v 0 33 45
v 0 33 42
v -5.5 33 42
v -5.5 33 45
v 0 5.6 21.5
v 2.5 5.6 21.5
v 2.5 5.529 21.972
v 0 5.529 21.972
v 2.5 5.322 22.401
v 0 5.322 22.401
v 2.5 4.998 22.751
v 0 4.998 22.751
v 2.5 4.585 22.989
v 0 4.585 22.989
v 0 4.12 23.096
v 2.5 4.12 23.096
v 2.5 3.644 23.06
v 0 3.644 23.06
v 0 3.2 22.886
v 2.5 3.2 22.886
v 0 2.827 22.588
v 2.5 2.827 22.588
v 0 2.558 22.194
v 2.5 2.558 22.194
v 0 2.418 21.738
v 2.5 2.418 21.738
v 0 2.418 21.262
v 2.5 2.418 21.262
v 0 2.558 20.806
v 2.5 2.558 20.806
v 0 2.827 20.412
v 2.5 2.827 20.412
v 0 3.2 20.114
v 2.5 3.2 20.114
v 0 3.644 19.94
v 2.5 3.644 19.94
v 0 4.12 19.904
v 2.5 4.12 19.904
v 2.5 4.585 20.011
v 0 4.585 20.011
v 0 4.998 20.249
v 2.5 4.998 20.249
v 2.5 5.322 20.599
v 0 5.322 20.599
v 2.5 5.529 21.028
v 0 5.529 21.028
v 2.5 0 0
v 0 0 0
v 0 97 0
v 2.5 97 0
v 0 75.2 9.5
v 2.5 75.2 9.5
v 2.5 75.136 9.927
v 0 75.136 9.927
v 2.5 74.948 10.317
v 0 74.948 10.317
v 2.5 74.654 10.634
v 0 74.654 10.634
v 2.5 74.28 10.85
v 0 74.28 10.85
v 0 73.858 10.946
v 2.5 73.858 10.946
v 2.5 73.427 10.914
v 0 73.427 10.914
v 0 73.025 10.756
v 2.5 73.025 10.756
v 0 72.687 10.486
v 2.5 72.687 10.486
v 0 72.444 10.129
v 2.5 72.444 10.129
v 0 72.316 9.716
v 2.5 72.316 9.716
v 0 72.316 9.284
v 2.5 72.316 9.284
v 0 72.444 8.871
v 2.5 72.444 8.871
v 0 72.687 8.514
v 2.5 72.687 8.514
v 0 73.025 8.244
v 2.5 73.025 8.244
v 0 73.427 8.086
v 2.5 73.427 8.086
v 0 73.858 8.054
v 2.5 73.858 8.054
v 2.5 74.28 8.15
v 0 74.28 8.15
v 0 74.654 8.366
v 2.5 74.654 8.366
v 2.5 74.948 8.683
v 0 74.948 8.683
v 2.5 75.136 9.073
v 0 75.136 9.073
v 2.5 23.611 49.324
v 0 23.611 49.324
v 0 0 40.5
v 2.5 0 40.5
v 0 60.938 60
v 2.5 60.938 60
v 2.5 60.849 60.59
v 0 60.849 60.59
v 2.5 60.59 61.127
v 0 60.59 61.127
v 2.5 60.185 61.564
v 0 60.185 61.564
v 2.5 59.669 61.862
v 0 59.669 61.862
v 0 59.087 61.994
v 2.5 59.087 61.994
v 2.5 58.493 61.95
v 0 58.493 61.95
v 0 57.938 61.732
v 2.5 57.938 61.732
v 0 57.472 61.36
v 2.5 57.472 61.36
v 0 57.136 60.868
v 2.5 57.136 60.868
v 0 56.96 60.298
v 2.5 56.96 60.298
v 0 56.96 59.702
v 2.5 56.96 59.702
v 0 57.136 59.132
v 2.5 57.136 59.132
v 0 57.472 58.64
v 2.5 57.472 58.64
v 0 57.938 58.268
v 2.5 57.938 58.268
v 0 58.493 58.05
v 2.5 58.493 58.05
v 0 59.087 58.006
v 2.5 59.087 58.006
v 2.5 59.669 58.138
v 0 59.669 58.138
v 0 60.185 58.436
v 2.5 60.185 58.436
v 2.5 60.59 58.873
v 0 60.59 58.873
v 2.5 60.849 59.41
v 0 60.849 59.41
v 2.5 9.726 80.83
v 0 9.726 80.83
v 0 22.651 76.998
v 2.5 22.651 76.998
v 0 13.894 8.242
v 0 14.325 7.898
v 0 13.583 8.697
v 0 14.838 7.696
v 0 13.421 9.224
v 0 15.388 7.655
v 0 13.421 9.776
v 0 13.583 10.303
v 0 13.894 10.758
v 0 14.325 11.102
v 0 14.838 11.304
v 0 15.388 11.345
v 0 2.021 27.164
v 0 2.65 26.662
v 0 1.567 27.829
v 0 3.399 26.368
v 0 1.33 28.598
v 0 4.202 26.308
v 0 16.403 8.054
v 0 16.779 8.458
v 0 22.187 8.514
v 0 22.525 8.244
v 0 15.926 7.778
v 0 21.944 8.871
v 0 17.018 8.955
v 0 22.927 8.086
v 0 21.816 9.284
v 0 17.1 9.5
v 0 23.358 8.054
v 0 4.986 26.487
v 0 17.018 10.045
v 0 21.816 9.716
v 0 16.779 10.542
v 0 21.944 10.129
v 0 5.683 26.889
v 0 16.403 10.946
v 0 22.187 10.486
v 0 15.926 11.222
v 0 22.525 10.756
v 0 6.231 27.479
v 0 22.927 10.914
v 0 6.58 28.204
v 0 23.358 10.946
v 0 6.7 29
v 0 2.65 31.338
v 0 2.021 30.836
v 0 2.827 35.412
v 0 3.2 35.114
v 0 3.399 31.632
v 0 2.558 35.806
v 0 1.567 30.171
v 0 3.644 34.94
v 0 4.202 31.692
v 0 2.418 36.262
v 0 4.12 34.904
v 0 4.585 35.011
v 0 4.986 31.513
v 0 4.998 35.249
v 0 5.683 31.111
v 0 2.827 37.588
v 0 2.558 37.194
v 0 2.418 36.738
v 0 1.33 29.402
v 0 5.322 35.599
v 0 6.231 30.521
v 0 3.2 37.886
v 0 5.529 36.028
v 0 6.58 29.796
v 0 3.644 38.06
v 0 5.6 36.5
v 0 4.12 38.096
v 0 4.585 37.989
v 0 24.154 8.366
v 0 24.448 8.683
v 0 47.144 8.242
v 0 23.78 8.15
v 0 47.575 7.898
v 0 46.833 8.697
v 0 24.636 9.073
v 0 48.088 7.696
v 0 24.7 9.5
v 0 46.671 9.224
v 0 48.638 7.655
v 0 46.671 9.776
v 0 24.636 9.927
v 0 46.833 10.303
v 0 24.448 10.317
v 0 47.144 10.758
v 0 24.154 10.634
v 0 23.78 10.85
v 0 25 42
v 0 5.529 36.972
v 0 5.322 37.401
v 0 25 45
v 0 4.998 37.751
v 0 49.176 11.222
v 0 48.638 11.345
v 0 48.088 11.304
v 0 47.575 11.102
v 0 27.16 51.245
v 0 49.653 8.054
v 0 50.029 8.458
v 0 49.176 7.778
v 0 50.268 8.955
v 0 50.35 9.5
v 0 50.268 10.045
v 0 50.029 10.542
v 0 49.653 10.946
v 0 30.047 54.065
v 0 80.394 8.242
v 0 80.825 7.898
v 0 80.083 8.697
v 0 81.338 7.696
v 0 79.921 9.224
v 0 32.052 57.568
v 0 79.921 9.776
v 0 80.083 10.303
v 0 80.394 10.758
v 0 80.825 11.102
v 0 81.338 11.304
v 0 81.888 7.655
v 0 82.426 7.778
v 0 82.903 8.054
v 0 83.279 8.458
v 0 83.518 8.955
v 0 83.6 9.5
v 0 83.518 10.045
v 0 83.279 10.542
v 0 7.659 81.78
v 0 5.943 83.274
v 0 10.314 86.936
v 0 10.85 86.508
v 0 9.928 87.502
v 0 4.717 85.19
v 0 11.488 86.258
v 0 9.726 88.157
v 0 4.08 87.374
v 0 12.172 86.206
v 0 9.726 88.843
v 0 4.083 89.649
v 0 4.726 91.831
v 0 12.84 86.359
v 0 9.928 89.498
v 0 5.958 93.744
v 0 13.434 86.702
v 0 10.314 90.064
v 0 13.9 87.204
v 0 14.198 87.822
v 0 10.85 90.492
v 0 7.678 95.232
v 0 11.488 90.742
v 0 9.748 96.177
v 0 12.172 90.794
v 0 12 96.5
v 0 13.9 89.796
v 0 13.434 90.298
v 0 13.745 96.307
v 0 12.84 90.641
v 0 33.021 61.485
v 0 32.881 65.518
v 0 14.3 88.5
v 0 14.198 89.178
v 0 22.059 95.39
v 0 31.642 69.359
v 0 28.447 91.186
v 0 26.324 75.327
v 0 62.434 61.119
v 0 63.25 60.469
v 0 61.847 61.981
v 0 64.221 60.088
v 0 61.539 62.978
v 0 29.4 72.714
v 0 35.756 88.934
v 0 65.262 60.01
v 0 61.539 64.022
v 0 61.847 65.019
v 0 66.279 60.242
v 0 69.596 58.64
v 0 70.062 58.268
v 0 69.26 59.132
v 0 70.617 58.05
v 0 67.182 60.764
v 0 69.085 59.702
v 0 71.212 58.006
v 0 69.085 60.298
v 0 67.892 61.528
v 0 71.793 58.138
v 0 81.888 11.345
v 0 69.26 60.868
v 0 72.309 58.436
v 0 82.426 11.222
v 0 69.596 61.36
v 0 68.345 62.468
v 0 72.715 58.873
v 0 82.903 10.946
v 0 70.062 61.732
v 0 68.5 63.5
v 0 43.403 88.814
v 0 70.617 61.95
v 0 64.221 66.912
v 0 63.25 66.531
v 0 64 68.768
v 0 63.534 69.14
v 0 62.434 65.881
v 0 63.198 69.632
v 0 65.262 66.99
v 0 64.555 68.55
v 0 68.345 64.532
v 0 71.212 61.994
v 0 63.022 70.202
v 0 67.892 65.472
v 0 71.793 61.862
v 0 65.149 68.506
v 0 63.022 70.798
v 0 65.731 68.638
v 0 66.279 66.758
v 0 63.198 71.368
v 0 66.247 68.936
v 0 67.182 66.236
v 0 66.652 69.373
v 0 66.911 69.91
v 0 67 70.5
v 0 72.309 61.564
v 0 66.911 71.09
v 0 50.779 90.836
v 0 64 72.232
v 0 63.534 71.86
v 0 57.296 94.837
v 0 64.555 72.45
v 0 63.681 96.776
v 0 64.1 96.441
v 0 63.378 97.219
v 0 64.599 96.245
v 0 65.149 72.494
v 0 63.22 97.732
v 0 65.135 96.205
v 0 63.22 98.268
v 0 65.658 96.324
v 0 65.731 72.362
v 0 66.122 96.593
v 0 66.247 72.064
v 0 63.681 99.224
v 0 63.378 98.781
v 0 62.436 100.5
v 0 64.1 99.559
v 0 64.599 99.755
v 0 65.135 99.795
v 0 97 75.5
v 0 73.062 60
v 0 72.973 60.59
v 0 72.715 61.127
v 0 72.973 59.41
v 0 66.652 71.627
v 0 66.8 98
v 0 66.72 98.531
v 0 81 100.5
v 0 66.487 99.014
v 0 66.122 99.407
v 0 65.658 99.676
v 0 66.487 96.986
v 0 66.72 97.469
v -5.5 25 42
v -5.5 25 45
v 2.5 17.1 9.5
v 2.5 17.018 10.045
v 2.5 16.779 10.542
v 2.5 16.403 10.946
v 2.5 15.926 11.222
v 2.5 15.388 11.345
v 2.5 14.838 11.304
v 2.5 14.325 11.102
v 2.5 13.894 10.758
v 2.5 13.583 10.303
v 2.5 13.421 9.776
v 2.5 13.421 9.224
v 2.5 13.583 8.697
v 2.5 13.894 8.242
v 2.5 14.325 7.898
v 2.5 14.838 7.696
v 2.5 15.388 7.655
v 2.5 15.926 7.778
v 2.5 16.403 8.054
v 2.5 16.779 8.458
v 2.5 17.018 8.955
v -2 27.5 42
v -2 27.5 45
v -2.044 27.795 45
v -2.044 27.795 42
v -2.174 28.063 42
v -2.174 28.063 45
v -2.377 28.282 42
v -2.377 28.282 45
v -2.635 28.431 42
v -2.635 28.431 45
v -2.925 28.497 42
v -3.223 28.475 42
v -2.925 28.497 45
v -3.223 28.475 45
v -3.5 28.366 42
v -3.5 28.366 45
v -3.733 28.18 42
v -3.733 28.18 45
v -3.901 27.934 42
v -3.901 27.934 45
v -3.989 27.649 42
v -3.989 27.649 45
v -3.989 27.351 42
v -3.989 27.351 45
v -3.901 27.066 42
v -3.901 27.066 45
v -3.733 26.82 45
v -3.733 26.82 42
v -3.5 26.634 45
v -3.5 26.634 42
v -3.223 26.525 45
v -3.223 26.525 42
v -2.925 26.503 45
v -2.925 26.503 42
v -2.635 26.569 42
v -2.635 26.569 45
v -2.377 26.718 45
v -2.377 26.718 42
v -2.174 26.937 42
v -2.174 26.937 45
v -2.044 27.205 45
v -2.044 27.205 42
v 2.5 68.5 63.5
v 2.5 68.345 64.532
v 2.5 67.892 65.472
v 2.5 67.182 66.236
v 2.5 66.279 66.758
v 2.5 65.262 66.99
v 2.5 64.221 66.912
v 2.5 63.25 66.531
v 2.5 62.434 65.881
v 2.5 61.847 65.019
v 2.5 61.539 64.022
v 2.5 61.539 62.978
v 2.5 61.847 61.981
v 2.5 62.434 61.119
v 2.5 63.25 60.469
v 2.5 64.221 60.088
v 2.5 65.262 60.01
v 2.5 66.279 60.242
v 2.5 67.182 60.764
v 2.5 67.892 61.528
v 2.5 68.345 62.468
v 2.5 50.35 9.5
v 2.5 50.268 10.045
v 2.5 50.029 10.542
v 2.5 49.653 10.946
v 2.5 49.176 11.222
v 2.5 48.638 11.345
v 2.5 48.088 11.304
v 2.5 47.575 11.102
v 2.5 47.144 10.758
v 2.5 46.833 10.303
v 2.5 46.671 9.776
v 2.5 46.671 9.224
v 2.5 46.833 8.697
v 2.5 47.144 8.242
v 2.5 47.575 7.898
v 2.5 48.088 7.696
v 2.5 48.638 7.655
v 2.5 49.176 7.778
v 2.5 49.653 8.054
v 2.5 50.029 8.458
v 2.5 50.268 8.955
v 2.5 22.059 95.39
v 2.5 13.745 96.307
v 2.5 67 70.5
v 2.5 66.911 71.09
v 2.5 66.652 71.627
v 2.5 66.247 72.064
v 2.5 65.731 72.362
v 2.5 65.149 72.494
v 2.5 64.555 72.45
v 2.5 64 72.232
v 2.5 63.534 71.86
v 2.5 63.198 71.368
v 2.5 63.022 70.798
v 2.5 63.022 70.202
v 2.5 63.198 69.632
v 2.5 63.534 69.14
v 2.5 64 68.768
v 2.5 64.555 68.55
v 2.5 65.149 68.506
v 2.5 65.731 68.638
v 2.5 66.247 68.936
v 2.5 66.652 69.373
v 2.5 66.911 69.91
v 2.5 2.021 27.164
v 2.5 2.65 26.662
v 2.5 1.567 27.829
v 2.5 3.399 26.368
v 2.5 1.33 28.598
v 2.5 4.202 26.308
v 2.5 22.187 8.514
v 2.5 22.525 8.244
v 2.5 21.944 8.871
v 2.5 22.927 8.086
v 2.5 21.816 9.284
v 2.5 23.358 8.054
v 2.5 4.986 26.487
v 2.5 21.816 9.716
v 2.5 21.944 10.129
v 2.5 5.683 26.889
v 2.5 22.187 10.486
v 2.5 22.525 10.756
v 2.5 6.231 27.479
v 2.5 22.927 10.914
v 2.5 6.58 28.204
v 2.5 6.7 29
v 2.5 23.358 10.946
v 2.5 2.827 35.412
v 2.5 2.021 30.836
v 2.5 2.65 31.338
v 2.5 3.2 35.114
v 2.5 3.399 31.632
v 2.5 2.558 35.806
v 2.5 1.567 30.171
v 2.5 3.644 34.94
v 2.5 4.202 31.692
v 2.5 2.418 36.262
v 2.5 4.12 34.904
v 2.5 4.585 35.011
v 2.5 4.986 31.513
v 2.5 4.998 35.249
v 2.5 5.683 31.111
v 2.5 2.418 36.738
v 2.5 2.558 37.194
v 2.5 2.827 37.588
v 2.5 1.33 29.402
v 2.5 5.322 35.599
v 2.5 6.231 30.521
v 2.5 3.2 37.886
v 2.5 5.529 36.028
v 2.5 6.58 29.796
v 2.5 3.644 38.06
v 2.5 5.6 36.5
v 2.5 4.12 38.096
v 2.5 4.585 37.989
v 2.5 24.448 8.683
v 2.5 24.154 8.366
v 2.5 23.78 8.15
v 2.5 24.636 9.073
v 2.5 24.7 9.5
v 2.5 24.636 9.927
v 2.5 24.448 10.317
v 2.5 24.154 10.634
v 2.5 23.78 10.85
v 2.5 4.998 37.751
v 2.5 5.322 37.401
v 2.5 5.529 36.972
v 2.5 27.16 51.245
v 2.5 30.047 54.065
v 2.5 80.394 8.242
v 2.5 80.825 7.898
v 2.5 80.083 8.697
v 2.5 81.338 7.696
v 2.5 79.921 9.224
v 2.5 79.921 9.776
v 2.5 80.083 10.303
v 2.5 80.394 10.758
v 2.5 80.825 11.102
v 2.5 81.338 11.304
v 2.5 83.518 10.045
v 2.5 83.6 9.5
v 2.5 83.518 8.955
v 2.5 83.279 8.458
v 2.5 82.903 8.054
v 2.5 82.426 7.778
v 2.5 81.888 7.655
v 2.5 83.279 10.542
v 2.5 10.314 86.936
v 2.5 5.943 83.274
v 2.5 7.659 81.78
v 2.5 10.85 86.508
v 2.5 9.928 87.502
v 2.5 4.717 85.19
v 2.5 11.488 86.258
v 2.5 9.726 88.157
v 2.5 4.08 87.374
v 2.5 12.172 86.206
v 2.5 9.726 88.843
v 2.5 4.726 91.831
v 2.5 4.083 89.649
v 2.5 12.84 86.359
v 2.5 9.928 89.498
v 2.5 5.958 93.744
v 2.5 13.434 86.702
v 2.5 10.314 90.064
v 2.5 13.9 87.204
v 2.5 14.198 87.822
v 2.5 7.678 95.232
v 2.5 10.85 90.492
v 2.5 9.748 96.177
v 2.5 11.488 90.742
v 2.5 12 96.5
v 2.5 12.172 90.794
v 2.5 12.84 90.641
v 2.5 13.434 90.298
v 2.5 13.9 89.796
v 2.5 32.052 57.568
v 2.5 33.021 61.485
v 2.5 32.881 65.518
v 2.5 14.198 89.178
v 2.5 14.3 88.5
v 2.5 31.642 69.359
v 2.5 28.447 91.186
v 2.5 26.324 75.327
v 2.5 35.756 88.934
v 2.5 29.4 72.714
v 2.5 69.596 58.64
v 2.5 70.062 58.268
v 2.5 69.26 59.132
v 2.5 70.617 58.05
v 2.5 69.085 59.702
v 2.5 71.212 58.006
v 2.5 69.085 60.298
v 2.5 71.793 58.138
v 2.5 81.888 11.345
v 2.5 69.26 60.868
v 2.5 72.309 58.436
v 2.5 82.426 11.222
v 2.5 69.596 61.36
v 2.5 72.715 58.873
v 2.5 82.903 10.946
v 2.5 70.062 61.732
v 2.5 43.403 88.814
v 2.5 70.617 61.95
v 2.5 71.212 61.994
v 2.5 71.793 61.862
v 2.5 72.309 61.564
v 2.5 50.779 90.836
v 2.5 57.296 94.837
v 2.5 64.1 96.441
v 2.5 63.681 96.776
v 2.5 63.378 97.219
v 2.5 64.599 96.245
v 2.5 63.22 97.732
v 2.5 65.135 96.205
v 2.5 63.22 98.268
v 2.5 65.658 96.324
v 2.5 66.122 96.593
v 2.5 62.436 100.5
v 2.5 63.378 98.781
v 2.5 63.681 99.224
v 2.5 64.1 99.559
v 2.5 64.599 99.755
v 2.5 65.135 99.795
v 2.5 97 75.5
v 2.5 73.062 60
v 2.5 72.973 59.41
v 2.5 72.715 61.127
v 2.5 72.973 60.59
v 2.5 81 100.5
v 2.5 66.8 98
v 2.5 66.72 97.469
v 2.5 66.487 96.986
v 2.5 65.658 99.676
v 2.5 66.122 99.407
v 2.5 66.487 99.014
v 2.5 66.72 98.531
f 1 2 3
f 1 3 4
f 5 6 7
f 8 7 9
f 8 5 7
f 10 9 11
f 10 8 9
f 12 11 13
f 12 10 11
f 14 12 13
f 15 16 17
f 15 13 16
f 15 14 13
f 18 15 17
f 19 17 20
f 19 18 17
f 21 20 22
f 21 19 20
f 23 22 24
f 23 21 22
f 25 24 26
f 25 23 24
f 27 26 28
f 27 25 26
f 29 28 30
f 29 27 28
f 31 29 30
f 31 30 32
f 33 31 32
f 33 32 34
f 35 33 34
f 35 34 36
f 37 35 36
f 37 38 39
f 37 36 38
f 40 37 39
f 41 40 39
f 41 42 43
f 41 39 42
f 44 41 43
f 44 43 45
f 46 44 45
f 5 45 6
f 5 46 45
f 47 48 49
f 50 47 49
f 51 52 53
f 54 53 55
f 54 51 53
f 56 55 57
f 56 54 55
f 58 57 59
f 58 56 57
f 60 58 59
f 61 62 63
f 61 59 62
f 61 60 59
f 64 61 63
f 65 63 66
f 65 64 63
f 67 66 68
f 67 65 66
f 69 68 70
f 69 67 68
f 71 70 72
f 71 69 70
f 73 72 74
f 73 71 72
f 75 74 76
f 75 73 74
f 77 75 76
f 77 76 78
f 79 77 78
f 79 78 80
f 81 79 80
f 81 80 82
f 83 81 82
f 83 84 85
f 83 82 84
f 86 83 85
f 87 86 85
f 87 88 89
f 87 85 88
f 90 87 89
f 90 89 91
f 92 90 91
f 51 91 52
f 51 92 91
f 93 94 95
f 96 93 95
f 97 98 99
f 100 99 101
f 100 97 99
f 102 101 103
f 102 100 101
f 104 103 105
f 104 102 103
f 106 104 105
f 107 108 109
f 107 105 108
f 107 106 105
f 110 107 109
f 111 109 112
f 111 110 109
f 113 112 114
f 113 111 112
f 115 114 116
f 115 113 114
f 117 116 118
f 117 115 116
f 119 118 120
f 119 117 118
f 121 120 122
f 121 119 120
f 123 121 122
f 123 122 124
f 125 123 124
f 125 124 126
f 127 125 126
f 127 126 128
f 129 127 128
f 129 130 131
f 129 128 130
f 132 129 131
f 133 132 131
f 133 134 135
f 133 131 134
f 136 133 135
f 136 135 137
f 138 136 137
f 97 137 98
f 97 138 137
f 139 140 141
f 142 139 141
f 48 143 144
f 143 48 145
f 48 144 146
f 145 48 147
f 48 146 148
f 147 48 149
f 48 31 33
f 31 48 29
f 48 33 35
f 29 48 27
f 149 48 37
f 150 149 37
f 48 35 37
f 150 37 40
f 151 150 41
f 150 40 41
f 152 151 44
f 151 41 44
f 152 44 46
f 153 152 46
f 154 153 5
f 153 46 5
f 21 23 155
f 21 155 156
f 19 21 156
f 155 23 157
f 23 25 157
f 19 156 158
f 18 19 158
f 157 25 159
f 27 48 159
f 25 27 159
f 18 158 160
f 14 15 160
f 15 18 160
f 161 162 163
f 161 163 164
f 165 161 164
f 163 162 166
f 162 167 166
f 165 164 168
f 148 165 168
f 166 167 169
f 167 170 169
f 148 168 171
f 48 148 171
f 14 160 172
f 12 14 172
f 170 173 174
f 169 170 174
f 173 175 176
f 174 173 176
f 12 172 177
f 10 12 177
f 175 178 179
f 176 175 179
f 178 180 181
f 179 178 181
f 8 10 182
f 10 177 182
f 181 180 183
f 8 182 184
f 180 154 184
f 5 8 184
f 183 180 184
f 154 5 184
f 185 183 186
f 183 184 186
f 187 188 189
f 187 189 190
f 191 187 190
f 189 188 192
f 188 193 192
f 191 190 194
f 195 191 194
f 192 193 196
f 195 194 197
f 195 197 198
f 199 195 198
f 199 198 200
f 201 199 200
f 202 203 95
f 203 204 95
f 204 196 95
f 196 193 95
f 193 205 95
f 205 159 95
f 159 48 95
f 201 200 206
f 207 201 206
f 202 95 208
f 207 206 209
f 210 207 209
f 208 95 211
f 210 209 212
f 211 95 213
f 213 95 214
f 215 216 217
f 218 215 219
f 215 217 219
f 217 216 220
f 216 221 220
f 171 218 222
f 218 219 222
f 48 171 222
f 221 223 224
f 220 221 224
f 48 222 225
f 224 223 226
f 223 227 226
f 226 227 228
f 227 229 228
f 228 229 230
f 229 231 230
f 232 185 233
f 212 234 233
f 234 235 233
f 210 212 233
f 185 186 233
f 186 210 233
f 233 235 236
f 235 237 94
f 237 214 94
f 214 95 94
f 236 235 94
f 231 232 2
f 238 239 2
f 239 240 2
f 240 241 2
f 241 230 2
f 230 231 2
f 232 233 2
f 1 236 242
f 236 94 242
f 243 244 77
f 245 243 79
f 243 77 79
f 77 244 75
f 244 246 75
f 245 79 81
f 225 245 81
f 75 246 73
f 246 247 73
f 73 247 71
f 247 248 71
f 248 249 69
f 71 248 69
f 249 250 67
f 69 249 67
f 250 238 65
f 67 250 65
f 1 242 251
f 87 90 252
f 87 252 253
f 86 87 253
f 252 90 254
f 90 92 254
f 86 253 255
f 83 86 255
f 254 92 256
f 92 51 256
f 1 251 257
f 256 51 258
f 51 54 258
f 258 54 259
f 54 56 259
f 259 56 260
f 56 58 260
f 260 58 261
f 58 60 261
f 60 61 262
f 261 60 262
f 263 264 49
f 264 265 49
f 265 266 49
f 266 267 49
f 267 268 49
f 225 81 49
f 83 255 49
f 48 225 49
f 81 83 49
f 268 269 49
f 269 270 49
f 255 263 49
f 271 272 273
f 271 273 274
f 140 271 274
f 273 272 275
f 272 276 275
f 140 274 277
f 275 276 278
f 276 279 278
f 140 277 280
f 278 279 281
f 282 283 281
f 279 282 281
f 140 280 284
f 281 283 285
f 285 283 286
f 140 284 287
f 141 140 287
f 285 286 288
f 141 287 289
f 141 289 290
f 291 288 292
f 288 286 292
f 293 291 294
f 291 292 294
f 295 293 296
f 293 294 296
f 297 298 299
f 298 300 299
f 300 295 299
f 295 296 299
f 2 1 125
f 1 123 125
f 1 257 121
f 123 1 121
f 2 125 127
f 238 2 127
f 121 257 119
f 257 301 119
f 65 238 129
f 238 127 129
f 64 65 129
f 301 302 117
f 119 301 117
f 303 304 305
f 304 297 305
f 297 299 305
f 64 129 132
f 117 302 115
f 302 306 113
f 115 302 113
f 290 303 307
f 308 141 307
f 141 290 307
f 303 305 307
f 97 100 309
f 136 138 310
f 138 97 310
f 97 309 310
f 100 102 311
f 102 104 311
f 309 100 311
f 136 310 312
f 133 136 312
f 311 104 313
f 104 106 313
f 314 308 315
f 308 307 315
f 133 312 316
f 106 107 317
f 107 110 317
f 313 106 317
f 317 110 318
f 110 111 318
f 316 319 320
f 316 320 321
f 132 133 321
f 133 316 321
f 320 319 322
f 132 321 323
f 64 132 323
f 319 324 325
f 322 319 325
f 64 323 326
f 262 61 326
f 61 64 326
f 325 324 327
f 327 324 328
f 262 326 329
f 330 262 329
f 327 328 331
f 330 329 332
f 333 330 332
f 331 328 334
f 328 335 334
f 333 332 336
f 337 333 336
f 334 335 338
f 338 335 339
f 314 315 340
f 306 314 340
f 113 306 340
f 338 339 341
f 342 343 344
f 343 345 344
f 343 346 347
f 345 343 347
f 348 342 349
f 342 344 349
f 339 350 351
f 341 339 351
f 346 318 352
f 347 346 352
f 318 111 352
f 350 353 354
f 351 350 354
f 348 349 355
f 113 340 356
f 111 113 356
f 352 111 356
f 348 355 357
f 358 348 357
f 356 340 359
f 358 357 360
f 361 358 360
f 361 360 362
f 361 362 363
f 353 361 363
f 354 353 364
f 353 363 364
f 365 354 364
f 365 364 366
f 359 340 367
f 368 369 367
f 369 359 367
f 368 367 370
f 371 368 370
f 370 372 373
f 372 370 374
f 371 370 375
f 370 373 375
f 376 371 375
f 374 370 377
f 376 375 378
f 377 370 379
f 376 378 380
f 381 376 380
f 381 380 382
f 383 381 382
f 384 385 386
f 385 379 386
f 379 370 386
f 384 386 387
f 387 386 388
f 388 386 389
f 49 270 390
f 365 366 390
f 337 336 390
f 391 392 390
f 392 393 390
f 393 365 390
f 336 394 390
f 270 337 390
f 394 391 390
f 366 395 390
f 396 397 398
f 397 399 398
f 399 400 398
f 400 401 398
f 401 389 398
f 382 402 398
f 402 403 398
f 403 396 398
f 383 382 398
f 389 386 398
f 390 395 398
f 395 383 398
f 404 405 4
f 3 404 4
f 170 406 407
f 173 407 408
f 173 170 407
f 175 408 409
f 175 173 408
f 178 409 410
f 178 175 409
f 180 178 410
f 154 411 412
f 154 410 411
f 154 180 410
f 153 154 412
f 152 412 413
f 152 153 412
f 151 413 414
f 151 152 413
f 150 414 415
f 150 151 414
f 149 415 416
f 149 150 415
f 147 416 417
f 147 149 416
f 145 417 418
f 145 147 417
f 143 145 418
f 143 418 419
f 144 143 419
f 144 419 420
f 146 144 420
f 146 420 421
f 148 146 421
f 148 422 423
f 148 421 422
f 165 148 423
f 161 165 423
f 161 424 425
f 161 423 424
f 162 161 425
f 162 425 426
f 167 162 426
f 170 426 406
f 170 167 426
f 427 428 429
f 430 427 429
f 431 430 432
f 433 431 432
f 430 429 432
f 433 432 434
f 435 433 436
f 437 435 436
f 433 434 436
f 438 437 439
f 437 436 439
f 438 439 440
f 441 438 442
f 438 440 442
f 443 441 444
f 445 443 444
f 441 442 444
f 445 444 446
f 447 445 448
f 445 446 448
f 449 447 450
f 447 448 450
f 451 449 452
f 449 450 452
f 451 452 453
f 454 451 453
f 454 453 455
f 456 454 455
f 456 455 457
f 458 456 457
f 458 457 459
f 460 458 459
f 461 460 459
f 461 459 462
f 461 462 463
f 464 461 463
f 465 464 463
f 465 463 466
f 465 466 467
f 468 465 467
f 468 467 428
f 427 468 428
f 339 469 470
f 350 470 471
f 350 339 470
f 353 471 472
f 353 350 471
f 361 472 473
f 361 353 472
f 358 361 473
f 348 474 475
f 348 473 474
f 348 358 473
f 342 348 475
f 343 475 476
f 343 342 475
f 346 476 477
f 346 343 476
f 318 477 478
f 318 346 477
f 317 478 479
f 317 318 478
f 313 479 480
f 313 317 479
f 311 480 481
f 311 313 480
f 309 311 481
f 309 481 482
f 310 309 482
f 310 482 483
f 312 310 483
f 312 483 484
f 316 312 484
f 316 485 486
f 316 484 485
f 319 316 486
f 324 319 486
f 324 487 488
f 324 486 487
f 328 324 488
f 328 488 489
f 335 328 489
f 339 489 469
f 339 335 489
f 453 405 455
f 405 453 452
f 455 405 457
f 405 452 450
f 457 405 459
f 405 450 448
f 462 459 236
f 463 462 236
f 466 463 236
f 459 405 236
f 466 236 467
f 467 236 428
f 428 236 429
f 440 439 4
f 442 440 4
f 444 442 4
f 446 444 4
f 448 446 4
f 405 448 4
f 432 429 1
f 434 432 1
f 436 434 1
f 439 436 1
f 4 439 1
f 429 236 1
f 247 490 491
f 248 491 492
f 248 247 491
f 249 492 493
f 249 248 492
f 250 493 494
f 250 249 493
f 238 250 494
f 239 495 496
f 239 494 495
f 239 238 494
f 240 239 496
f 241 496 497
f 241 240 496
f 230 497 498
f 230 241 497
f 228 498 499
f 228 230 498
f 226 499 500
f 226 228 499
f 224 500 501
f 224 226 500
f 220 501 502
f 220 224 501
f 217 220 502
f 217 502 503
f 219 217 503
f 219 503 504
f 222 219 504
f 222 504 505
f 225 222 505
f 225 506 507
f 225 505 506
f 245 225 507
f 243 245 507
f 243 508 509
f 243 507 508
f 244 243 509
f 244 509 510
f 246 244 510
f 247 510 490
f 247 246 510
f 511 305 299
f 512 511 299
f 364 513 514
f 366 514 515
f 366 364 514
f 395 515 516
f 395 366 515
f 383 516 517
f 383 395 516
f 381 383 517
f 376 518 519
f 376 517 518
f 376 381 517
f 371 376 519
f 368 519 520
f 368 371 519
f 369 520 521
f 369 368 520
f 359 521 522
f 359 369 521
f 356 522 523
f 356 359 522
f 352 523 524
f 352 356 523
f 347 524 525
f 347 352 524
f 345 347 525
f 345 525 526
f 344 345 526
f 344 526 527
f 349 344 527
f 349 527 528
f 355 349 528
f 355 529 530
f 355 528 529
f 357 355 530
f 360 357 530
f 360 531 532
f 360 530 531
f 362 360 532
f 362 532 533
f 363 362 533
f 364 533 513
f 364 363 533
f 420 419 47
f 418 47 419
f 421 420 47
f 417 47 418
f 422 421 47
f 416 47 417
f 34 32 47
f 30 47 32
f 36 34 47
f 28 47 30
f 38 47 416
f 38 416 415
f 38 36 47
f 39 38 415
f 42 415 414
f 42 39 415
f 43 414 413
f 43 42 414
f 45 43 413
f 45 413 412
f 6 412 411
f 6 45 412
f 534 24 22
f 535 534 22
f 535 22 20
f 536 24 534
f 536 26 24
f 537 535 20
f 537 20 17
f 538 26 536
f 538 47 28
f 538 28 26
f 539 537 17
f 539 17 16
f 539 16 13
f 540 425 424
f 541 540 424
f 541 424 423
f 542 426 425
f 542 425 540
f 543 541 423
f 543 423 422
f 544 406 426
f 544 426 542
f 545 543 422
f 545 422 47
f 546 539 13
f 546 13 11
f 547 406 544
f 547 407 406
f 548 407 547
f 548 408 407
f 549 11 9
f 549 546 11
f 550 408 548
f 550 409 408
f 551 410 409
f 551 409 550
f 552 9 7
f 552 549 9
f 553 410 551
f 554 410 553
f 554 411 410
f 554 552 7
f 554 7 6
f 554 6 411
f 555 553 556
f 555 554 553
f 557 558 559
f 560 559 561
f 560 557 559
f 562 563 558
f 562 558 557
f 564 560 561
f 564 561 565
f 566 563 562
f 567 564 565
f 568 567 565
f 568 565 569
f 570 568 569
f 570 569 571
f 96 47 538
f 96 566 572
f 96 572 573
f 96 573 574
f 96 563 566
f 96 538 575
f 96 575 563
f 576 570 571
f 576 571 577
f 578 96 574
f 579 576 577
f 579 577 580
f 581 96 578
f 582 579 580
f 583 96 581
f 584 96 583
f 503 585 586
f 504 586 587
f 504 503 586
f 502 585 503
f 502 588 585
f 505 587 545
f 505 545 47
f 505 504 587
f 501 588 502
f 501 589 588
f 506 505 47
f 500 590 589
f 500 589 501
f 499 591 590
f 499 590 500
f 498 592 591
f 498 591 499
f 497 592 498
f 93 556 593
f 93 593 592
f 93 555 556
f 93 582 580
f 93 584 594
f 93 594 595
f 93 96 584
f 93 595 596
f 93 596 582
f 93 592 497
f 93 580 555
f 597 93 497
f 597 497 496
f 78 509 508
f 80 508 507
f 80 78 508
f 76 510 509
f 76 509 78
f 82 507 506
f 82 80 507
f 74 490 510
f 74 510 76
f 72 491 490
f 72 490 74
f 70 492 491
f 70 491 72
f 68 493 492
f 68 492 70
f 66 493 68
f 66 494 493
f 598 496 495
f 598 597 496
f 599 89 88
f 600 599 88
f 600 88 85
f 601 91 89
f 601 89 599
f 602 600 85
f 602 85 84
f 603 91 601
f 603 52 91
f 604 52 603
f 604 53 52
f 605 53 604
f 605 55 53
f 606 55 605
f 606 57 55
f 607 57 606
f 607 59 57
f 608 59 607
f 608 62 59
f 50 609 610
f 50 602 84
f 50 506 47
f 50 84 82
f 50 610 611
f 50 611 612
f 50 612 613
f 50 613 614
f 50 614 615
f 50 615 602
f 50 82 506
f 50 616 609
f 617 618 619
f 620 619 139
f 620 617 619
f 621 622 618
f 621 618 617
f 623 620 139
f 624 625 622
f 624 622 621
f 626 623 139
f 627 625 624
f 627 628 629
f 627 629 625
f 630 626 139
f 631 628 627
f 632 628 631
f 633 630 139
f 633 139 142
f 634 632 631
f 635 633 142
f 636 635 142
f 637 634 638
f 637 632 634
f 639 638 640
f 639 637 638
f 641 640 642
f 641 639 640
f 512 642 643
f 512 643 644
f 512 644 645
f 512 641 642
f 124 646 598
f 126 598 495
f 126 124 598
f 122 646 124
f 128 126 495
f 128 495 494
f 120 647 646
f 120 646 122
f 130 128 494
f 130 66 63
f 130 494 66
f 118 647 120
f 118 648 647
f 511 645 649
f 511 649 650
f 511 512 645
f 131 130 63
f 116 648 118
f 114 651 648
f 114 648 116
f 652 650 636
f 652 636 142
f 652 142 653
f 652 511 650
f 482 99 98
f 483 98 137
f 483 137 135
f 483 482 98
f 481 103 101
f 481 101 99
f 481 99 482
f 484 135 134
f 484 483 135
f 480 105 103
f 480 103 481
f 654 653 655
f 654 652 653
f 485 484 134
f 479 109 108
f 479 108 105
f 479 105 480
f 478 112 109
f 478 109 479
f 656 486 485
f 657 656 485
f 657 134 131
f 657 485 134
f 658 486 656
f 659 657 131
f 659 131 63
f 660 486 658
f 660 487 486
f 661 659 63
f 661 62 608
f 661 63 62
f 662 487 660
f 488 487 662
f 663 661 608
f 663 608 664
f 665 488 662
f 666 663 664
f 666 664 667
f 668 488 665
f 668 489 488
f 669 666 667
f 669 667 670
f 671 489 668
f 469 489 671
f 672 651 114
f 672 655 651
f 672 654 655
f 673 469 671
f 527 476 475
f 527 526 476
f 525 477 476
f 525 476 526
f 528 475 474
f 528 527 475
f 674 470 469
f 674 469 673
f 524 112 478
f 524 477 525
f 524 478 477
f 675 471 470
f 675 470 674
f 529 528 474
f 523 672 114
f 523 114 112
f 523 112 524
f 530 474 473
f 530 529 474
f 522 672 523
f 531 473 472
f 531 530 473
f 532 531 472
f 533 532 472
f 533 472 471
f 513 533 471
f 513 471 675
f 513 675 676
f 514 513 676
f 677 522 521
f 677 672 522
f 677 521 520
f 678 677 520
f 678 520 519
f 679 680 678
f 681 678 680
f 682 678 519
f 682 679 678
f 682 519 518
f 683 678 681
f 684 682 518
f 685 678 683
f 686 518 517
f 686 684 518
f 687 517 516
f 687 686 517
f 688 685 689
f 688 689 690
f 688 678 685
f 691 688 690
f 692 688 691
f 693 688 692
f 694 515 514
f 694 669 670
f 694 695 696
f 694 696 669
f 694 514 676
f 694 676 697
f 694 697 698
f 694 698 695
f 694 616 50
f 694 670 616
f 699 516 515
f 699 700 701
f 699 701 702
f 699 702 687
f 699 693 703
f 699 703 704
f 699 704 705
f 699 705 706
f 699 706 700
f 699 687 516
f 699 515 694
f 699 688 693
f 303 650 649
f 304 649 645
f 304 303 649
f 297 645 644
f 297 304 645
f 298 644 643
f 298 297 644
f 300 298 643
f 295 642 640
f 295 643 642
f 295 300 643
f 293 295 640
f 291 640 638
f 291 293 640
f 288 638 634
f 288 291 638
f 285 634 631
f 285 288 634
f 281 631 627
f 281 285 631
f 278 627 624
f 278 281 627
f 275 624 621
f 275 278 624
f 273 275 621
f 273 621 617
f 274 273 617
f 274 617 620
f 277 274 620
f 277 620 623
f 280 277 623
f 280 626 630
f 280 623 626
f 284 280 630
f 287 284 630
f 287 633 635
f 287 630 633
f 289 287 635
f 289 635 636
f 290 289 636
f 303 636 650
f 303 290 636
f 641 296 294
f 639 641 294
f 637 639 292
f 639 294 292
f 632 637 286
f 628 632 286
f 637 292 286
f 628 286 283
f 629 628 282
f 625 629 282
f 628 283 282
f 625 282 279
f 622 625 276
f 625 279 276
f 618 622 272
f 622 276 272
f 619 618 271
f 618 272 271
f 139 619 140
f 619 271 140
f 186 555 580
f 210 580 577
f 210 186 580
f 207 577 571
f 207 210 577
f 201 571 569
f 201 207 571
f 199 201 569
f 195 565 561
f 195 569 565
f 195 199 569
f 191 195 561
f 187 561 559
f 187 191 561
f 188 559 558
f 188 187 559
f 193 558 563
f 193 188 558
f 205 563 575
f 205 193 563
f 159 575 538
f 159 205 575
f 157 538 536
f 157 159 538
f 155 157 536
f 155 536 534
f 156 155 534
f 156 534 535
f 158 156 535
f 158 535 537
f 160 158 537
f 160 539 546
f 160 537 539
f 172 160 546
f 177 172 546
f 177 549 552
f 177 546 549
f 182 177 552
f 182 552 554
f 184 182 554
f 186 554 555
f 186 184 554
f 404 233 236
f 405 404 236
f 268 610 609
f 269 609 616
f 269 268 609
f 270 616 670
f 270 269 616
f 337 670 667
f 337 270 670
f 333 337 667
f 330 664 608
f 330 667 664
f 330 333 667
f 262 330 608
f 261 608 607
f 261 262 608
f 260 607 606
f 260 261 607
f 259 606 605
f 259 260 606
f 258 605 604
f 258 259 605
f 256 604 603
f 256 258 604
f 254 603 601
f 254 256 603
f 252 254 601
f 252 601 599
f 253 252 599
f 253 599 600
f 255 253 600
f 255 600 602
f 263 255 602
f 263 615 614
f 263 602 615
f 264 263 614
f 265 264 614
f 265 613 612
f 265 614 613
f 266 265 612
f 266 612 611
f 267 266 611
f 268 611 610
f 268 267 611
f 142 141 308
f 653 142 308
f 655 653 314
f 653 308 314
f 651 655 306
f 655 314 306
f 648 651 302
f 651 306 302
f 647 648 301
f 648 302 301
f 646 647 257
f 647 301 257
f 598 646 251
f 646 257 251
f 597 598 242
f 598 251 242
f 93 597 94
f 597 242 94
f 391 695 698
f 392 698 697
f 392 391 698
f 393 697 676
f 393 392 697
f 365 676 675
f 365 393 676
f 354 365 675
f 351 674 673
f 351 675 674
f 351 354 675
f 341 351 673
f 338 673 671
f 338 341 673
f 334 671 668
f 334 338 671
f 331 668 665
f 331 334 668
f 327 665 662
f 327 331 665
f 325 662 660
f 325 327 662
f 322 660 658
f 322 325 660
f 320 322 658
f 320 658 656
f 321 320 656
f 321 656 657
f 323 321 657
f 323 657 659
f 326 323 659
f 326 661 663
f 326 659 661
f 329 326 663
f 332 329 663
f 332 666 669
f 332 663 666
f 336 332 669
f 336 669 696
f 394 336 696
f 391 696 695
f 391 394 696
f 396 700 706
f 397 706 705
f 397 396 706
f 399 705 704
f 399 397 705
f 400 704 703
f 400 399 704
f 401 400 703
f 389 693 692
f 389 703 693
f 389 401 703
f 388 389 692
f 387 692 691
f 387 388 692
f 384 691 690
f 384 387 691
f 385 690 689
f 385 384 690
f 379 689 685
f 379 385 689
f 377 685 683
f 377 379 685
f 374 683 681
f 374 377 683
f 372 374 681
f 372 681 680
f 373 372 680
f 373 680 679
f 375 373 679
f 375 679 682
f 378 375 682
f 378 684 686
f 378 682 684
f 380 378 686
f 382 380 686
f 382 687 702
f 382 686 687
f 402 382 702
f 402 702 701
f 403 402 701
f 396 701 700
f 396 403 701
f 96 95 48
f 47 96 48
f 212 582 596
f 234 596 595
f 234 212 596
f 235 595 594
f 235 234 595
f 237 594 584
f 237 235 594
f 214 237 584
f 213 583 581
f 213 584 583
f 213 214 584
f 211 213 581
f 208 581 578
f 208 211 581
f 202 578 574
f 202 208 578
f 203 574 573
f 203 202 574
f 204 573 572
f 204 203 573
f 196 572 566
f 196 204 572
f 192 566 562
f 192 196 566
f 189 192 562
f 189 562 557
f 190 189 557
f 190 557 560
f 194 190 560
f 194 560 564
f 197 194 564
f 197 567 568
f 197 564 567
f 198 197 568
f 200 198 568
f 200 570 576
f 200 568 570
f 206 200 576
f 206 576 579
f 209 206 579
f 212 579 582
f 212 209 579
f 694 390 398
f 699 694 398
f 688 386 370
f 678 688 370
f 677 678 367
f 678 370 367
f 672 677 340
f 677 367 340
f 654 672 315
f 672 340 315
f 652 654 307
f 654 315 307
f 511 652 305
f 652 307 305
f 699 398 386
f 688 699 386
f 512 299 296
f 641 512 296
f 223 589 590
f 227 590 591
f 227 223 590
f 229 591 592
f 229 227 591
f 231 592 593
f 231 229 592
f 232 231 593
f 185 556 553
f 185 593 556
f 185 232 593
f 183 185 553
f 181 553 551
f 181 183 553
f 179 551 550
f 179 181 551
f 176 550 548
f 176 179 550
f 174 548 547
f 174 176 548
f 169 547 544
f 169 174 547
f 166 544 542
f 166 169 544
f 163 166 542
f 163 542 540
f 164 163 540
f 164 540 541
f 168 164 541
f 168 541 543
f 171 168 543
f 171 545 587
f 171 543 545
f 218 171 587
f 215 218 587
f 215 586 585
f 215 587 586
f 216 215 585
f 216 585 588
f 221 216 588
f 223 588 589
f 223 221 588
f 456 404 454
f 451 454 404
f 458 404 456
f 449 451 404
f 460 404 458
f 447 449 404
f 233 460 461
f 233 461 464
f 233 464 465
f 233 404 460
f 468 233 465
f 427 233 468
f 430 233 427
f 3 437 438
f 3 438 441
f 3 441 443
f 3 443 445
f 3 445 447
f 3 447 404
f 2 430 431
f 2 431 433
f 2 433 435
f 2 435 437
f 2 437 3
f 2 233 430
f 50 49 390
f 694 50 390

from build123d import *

# Parameters (mm, degrees)
F2_DEPTH = 2.5
F1_R     = 1.8
F1_R_2   = 2
F1_R_3   = 3.5
F1_R_4   = 2.3
F1_R_5   = 1.6
F1_R_6   = 2.7
F1_R_7   = 1.85
F1_R_8   = 1.45
F3_DEPTH = 2.501
F4_W     = 8
F4_H     = 3
F5_DEPTH = 5.5
F6_R     = 1
F7_DEPTH = 45.001


with BuildPart() as f2:
    # F0 (on Right) → F2 (new body)
    with BuildSketch(Plane.YZ):
        with BuildLine():
            Line((0, 40.5), (0, 0))
            Line((0, 0), (97, 0))
            Line((97, 0), (97, 75.5))
            Line((97, 75.5), (81, 100.5))
            Line((81, 100.5), (62.435909, 100.5))
            ThreePointArc((62.435909, 100.5), (43.402845, 88.81449), (22.058582, 95.389522))
            Line((22.058582, 95.389522), (13.745146, 96.307334))
            Line((13.745146, 96.307334), (12, 96.5))
            ThreePointArc((12, 96.5), (4.082951, 89.649058), (9.725713, 80.830084))
            Line((9.725713, 80.830084), (22.650574, 76.997597))
            ThreePointArc((22.650574, 76.997597), (33.091215, 63.506399), (23.611014, 49.323833))
            Line((23.611014, 49.323833), (0, 40.5))
        make_face()
    extrude(amount=F2_DEPTH)

    # F1 (on Right) → F3 (cut, through all)
    with BuildSketch(Plane.YZ):
        with Locations((65, 98)):
            Circle(F1_R)
        with Locations((65, 70.5)):
            Circle(F1_R_2)
        with Locations((65, 63.5)):
            Circle(F1_R_3)
        with Locations((58.937822, 60)):
            Circle(F1_R_2)
        with Locations((71.062178, 60)):
            Circle(F1_R_2)
        with Locations((12, 88.5)):
            Circle(F1_R_4)
        with Locations((4, 36.5)):
            Circle(F1_R_5)
        with Locations((4, 29)):
            Circle(F1_R_6)
        with Locations((4, 21.5)):
            Circle(F1_R_5)
        with Locations((15.25, 9.5)):
            Circle(F1_R_7)
        with Locations((23.25, 9.5)):
            Circle(F1_R_8)
        with Locations((48.5, 9.5)):
            Circle(F1_R_7)
        with Locations((81.75, 9.5)):
            Circle(F1_R_7)
        with Locations((73.75, 9.5)):
            Circle(F1_R_8)
    extrude(amount=F3_DEPTH, mode=Mode.SUBTRACT)

    # F4 (on Right) → F5 (join)
    with BuildSketch(Plane.YZ):
        with Locations((29, 43.5)):
            Rectangle(F4_W, F4_H)
    extrude(amount=-F5_DEPTH)

    # F6 (on face) → F7 (cut, through all)
    with BuildSketch(Plane.XY.offset(45)):
        with Locations((-3, 27.5)):
            Circle(F6_R)
    extrude(amount=-F7_DEPTH, mode=Mode.SUBTRACT)


solid = f2.part
